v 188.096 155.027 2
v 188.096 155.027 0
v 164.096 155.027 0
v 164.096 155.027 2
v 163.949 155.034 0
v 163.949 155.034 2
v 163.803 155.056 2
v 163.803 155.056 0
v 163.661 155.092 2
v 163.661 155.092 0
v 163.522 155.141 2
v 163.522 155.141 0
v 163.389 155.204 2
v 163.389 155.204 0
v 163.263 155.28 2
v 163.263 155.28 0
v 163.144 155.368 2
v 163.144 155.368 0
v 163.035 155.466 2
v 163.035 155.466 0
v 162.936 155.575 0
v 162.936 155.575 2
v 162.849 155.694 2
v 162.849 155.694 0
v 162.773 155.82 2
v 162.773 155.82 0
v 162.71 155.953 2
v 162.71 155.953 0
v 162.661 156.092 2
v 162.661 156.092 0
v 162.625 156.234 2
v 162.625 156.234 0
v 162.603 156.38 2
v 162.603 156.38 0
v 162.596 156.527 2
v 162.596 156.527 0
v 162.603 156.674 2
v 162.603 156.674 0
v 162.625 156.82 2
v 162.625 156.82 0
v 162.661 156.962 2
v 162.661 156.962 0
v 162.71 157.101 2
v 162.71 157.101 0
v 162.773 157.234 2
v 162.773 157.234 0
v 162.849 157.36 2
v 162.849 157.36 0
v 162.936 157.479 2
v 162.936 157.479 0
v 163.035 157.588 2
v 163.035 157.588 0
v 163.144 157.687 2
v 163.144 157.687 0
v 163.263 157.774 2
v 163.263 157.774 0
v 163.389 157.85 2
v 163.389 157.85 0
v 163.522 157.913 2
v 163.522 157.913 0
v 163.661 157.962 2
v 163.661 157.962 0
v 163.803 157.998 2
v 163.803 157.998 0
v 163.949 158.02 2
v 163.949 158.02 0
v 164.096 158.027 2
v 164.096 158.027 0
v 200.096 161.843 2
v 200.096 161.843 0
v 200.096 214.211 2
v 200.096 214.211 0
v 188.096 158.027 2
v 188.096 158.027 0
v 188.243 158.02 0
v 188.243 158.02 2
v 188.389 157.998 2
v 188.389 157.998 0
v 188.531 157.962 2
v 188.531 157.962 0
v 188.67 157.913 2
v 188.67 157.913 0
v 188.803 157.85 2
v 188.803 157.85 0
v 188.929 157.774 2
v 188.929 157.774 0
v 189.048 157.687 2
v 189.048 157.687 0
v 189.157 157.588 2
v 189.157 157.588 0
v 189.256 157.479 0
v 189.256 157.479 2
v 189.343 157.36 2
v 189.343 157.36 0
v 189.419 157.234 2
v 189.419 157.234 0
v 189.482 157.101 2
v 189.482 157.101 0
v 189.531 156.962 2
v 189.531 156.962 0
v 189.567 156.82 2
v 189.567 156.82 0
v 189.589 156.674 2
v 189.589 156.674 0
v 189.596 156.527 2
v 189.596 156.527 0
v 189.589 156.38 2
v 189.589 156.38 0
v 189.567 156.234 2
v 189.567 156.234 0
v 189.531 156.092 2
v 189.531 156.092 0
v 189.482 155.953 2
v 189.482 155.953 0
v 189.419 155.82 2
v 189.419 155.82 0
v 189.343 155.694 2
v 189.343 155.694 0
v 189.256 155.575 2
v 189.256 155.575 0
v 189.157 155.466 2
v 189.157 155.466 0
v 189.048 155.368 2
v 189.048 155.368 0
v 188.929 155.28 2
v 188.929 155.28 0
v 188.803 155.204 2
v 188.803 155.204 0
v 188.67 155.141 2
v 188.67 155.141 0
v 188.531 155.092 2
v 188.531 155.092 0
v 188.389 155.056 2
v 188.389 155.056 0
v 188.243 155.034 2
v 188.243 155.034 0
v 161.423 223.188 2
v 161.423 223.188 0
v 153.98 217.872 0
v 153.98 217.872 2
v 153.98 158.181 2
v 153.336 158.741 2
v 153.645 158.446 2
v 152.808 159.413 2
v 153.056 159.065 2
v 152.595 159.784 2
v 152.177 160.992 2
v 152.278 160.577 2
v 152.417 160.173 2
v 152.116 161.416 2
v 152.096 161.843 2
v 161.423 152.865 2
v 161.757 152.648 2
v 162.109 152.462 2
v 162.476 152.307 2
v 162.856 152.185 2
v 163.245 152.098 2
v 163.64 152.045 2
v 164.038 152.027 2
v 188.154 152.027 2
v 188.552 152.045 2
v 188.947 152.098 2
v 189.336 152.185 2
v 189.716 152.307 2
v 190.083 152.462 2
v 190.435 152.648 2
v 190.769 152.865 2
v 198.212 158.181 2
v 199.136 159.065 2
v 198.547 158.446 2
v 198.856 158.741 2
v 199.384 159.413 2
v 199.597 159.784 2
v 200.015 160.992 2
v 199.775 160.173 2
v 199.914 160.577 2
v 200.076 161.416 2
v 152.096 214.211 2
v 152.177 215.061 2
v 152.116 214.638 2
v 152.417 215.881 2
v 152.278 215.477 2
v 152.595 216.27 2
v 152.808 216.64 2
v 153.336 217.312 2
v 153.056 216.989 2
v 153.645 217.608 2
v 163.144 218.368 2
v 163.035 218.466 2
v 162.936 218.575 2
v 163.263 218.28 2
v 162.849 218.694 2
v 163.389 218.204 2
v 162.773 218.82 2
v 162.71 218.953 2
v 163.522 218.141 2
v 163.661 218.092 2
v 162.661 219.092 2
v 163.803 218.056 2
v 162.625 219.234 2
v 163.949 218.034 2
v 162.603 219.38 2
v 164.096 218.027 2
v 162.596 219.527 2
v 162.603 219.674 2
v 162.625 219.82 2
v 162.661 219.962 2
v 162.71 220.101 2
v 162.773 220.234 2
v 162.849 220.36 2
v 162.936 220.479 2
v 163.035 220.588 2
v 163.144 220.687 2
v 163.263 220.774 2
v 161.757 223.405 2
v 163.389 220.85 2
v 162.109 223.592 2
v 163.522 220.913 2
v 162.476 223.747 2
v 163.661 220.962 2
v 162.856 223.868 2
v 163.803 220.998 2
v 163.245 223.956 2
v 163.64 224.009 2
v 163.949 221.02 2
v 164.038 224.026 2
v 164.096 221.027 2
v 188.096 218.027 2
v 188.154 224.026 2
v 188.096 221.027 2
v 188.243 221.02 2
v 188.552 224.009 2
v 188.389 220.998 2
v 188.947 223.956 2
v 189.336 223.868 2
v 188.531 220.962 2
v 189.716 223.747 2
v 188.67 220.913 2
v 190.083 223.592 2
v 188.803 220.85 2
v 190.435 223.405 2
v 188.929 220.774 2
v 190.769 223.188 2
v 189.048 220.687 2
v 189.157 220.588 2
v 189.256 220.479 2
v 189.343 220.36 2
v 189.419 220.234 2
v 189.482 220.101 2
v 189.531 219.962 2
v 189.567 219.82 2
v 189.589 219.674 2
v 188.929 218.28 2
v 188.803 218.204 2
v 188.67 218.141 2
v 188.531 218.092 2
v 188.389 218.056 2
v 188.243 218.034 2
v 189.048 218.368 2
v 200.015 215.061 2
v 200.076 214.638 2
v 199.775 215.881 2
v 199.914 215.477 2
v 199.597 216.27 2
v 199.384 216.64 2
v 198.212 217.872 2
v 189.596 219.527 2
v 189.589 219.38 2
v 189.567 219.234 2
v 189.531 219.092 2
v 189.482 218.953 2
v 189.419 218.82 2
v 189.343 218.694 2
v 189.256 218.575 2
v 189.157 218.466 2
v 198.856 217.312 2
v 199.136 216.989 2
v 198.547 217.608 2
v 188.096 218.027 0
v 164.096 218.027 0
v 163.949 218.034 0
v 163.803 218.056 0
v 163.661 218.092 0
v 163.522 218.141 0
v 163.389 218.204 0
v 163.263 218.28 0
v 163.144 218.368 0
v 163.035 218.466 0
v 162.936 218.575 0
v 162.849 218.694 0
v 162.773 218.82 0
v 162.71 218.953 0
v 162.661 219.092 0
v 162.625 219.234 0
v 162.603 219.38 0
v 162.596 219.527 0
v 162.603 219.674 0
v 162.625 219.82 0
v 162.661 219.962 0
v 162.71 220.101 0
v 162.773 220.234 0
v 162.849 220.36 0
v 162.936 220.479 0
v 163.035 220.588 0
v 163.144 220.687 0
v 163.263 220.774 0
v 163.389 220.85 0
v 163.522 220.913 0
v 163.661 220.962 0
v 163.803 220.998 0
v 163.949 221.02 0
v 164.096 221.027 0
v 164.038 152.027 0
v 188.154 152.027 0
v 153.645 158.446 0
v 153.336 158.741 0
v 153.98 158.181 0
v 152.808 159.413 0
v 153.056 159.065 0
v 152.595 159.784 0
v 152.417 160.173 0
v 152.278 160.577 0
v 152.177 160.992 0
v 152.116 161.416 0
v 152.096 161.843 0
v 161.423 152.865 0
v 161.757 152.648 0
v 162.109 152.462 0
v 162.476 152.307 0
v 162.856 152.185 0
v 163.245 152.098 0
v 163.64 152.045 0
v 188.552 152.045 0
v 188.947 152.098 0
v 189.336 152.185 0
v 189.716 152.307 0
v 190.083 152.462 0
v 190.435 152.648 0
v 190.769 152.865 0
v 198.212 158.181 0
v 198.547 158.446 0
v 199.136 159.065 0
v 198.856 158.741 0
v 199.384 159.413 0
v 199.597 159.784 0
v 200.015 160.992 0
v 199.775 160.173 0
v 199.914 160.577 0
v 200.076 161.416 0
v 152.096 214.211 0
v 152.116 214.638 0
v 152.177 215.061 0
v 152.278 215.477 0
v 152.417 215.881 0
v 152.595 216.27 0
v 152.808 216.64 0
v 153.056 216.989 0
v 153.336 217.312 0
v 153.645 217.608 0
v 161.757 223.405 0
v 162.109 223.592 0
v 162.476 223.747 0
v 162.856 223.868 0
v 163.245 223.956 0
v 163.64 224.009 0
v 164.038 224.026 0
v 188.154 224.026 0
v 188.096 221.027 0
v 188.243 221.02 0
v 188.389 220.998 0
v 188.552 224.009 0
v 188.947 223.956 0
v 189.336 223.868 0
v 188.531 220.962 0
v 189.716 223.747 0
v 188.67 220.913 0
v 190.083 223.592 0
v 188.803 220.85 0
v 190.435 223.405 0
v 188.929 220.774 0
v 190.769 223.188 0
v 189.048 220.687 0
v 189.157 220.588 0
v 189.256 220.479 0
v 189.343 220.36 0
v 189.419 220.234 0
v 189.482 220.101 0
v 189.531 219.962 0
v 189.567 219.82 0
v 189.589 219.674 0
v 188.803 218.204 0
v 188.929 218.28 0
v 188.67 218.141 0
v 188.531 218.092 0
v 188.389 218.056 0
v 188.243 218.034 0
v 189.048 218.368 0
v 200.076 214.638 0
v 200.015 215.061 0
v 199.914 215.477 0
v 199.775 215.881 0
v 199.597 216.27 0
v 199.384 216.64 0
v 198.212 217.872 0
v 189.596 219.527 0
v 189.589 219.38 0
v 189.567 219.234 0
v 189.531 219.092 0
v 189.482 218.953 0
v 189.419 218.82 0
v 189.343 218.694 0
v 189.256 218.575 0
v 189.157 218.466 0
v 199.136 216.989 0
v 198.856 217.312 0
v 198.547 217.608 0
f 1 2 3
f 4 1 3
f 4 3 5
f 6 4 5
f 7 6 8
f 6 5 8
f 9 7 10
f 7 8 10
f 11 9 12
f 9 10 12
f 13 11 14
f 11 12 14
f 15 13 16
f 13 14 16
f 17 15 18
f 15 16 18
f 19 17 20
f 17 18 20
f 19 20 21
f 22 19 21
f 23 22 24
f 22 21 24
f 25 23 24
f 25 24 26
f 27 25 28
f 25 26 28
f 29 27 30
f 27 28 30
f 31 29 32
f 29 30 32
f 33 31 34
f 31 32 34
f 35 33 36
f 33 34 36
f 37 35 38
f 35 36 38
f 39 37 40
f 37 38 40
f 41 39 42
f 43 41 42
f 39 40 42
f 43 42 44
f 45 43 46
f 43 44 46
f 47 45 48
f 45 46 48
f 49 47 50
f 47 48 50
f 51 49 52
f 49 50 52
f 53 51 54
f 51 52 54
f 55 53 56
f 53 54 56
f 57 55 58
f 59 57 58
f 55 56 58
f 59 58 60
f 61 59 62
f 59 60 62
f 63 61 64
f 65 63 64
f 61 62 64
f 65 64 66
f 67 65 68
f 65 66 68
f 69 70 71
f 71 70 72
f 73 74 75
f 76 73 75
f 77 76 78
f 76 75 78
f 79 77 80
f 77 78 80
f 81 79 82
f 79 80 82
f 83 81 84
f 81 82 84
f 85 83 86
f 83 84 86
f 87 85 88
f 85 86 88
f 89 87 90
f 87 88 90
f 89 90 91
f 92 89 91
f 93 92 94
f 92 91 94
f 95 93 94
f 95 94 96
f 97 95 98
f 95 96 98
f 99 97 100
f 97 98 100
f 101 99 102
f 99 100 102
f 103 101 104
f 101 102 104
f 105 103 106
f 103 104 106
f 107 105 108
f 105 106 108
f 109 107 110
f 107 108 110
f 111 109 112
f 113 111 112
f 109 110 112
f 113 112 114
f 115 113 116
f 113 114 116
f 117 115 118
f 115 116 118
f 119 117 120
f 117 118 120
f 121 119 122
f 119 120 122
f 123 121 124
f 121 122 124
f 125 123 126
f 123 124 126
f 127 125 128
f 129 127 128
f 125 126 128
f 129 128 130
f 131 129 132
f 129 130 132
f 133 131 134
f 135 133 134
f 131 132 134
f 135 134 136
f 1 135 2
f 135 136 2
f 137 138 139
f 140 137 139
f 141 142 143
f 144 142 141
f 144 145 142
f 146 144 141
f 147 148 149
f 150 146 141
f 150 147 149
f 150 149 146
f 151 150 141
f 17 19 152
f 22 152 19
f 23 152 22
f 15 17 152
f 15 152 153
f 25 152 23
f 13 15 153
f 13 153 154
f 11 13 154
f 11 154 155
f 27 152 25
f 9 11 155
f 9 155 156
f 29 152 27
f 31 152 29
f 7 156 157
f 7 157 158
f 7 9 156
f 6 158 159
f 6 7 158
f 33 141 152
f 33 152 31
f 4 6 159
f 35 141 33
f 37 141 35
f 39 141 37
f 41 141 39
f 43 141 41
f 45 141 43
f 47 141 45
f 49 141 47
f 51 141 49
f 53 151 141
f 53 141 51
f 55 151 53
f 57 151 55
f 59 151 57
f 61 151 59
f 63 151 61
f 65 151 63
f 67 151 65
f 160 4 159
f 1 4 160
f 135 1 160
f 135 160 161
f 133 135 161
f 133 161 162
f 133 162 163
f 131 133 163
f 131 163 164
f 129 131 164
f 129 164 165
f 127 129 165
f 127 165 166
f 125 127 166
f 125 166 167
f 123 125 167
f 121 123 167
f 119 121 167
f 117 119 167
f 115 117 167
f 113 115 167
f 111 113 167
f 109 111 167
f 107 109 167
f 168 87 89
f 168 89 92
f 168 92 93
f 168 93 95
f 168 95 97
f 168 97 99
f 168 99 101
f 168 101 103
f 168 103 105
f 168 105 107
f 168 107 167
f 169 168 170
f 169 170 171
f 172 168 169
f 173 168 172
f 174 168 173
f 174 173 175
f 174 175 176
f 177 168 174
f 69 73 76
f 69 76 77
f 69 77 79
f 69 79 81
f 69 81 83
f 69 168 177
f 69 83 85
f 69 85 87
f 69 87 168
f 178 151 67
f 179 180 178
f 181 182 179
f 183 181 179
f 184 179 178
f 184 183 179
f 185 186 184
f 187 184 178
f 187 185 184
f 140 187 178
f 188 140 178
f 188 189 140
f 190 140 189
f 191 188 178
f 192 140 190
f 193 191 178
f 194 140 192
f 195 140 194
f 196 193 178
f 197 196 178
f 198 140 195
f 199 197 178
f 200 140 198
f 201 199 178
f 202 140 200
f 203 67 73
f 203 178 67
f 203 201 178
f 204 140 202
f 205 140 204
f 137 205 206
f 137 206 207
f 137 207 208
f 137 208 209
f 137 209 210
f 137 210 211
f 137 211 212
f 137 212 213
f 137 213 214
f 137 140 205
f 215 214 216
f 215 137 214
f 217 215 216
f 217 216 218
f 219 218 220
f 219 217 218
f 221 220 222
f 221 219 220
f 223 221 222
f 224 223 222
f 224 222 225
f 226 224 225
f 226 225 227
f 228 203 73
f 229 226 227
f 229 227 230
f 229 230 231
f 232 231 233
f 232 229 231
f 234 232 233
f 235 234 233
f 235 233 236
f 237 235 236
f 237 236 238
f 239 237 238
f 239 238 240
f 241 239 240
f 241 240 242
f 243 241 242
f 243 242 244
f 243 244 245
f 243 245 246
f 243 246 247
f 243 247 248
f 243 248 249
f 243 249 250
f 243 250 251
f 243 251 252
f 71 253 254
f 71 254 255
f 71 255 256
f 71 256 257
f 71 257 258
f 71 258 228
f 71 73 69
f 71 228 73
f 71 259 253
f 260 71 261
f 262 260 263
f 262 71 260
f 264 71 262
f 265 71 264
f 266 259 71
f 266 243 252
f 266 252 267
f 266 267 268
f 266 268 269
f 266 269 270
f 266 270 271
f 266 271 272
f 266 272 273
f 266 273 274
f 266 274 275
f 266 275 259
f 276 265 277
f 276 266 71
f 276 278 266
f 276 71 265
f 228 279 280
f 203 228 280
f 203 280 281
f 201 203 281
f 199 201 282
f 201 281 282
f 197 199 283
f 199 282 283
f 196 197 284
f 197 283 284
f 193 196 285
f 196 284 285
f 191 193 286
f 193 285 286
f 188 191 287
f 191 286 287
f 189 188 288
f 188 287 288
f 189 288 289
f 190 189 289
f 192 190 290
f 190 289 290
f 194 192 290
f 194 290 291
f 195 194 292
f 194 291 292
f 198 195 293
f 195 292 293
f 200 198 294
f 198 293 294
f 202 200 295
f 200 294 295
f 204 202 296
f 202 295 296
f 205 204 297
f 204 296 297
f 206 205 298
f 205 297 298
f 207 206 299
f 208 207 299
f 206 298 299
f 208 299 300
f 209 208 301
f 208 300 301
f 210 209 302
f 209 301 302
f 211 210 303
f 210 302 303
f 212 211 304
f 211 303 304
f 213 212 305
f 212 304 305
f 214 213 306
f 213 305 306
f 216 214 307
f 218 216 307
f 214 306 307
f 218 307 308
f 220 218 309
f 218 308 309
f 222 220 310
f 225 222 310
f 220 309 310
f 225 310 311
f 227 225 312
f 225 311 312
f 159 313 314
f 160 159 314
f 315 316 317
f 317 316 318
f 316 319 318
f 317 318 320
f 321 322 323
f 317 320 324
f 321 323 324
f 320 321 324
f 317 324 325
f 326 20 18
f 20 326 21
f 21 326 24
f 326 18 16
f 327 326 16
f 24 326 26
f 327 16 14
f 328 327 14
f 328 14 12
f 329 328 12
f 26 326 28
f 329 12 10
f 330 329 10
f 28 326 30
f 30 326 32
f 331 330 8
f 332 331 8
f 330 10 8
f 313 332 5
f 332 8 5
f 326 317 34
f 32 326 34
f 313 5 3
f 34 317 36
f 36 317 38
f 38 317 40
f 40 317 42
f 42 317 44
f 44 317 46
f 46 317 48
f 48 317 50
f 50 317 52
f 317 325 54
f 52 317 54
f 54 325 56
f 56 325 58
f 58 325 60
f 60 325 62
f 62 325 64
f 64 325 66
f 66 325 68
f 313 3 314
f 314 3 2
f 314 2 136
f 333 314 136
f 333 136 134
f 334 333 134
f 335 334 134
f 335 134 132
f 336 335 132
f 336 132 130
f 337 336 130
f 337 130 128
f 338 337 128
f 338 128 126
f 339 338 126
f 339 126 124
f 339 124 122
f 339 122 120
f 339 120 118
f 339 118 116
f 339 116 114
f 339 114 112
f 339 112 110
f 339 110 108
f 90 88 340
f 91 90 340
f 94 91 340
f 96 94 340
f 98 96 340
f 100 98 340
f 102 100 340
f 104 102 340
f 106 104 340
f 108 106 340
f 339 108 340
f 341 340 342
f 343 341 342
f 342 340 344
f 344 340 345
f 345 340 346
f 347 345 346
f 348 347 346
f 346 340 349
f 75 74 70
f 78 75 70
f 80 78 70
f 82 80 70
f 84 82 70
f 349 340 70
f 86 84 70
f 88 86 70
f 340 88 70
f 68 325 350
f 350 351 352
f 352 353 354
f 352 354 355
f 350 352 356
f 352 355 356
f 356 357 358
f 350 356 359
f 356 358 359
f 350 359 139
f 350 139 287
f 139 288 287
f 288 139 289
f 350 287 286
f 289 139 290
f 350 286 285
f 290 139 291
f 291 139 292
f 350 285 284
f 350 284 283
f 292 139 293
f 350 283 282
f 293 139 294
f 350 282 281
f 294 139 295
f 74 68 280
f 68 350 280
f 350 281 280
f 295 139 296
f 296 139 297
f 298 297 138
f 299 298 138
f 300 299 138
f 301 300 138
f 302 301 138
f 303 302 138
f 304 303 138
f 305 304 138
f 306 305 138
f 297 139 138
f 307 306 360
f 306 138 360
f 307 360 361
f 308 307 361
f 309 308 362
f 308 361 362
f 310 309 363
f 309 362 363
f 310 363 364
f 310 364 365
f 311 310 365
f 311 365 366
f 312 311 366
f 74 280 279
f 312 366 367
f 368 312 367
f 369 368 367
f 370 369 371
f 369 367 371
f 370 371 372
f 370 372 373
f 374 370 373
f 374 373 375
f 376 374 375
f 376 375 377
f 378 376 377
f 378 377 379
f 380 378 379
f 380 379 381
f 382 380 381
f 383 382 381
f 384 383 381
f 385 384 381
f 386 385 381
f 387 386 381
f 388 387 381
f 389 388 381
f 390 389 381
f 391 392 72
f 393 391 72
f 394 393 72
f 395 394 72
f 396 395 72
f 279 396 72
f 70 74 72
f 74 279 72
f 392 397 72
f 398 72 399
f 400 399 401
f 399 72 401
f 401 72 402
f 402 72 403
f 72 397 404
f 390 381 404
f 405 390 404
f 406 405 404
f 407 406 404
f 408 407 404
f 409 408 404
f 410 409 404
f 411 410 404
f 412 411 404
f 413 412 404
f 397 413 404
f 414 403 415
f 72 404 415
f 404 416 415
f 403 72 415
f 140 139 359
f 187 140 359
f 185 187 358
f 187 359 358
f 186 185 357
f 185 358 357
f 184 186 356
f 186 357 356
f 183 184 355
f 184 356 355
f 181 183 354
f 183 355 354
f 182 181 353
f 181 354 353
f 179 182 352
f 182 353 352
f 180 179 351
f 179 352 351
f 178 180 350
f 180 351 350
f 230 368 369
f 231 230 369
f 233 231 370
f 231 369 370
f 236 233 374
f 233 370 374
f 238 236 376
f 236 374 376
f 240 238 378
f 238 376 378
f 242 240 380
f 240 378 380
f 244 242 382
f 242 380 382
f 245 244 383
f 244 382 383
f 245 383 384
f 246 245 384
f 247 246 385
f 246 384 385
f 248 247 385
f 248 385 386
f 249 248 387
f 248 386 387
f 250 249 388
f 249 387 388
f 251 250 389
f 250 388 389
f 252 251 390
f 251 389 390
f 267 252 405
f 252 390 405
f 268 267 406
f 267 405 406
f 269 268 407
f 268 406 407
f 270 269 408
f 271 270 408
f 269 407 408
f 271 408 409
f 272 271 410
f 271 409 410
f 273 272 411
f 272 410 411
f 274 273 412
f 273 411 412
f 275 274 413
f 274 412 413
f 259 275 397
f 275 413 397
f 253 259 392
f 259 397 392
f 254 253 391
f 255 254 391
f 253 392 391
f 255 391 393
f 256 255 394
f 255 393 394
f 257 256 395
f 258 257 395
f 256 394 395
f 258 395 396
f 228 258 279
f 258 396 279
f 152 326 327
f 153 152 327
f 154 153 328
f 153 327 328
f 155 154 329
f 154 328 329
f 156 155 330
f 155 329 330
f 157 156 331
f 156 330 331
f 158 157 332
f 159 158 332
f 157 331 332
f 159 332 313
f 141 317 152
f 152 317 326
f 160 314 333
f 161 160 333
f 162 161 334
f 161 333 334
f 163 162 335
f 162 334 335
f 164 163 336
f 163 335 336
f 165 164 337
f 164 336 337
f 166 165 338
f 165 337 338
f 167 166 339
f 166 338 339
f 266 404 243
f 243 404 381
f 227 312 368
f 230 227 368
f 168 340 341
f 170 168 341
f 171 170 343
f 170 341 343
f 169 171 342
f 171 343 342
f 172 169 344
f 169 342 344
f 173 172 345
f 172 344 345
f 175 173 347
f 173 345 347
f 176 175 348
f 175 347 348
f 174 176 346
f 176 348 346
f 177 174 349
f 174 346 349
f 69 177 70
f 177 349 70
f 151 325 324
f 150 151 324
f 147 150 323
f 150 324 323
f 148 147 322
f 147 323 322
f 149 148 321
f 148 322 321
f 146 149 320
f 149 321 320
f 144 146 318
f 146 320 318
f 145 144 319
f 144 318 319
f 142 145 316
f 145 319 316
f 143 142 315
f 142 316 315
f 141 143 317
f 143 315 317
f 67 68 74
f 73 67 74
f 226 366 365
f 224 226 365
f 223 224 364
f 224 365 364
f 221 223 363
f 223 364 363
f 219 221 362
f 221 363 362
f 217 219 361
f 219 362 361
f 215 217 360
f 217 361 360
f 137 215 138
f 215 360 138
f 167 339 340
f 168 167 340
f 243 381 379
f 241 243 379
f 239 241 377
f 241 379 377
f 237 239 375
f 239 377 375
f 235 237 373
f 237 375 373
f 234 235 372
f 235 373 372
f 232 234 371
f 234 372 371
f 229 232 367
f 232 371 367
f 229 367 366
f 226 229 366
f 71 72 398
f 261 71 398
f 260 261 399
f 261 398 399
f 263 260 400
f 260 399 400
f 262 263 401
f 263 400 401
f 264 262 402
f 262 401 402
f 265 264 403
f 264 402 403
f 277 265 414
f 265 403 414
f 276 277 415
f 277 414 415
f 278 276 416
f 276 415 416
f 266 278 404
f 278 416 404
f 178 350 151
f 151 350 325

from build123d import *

# Parameters (mm, degrees)
EXTRUIR1_DEPTH = 2


with BuildPart() as part:
    # Croquis1 → Extruir1 (new body)
    with BuildSketch(Plane.XY):
        with BuildLine():
            Line((200.095995896, 161.842834793), (200.095995896, 214.210663326))
            ThreePointArc((200.095995896, 214.210663326), (199.597250288, 216.26978044), (198.211567768, 217.872463947))
            Line((198.211567768, 217.872463947), (190.769475027, 223.188244475))
            ThreePointArc((190.769475027, 223.188244475), (189.527201595, 223.811773643), (188.153903155, 224.026443855))
            Line((188.153903155, 224.026443855), (164.038088636, 224.026443855))
            ThreePointArc((164.038088636, 224.026443855), (162.664790197, 223.811773643), (161.422516764, 223.188244475))
            Line((161.422516764, 223.188244475), (153.980424024, 217.872463947))
            ThreePointArc((153.980424024, 217.872463947), (152.594741504, 216.26978044), (152.095995896, 214.210663326))
            Line((152.095995896, 214.210663326), (152.095995896, 161.842834793))
            ThreePointArc((152.095995896, 161.842834793), (152.594741504, 159.783717679), (153.980424024, 158.181034173))
            Line((153.980424024, 158.181034173), (161.422516764, 152.865253644))
            ThreePointArc((161.422516764, 152.865253644), (162.664790197, 152.241724476), (164.038088636, 152.027054264))
            Line((164.038088636, 152.027054264), (188.153903155, 152.027054264))
            ThreePointArc((188.153903155, 152.027054264), (189.527201595, 152.241724476), (190.769475027, 152.865253644))
            Line((190.769475027, 152.865253644), (198.211567768, 158.181034173))
            ThreePointArc((198.211567768, 158.181034173), (199.597250288, 159.783717679), (200.095995896, 161.842834793))
        make_face()
        with BuildLine():
            Line((164.095995896, 158.027054265), (188.095995896, 158.027054265))
            ThreePointArc((188.095995896, 158.027054265), (189.595995896, 156.527054264), (188.095995896, 155.027054265))
            Line((188.095995896, 155.027054265), (164.095995896, 155.027054265))
            ThreePointArc((164.095995896, 155.027054265), (162.595995896, 156.527054264), (164.095995896, 158.027054265))
        make_face(mode=Mode.SUBTRACT)
        with BuildLine():
            Line((164.095995896, 221.027054265), (188.095995896, 221.027054265))
            ThreePointArc((188.095995896, 221.027054265), (189.595995896, 219.527054264), (188.095995896, 218.027054265))
            Line((188.095995896, 218.027054265), (164.095995896, 218.027054265))
            ThreePointArc((164.095995896, 218.027054265), (162.595995896, 219.527054264), (164.095995896, 221.027054265))
        make_face(mode=Mode.SUBTRACT)
    extrude(amount=EXTRUIR1_DEPTH)


solid = part.part
